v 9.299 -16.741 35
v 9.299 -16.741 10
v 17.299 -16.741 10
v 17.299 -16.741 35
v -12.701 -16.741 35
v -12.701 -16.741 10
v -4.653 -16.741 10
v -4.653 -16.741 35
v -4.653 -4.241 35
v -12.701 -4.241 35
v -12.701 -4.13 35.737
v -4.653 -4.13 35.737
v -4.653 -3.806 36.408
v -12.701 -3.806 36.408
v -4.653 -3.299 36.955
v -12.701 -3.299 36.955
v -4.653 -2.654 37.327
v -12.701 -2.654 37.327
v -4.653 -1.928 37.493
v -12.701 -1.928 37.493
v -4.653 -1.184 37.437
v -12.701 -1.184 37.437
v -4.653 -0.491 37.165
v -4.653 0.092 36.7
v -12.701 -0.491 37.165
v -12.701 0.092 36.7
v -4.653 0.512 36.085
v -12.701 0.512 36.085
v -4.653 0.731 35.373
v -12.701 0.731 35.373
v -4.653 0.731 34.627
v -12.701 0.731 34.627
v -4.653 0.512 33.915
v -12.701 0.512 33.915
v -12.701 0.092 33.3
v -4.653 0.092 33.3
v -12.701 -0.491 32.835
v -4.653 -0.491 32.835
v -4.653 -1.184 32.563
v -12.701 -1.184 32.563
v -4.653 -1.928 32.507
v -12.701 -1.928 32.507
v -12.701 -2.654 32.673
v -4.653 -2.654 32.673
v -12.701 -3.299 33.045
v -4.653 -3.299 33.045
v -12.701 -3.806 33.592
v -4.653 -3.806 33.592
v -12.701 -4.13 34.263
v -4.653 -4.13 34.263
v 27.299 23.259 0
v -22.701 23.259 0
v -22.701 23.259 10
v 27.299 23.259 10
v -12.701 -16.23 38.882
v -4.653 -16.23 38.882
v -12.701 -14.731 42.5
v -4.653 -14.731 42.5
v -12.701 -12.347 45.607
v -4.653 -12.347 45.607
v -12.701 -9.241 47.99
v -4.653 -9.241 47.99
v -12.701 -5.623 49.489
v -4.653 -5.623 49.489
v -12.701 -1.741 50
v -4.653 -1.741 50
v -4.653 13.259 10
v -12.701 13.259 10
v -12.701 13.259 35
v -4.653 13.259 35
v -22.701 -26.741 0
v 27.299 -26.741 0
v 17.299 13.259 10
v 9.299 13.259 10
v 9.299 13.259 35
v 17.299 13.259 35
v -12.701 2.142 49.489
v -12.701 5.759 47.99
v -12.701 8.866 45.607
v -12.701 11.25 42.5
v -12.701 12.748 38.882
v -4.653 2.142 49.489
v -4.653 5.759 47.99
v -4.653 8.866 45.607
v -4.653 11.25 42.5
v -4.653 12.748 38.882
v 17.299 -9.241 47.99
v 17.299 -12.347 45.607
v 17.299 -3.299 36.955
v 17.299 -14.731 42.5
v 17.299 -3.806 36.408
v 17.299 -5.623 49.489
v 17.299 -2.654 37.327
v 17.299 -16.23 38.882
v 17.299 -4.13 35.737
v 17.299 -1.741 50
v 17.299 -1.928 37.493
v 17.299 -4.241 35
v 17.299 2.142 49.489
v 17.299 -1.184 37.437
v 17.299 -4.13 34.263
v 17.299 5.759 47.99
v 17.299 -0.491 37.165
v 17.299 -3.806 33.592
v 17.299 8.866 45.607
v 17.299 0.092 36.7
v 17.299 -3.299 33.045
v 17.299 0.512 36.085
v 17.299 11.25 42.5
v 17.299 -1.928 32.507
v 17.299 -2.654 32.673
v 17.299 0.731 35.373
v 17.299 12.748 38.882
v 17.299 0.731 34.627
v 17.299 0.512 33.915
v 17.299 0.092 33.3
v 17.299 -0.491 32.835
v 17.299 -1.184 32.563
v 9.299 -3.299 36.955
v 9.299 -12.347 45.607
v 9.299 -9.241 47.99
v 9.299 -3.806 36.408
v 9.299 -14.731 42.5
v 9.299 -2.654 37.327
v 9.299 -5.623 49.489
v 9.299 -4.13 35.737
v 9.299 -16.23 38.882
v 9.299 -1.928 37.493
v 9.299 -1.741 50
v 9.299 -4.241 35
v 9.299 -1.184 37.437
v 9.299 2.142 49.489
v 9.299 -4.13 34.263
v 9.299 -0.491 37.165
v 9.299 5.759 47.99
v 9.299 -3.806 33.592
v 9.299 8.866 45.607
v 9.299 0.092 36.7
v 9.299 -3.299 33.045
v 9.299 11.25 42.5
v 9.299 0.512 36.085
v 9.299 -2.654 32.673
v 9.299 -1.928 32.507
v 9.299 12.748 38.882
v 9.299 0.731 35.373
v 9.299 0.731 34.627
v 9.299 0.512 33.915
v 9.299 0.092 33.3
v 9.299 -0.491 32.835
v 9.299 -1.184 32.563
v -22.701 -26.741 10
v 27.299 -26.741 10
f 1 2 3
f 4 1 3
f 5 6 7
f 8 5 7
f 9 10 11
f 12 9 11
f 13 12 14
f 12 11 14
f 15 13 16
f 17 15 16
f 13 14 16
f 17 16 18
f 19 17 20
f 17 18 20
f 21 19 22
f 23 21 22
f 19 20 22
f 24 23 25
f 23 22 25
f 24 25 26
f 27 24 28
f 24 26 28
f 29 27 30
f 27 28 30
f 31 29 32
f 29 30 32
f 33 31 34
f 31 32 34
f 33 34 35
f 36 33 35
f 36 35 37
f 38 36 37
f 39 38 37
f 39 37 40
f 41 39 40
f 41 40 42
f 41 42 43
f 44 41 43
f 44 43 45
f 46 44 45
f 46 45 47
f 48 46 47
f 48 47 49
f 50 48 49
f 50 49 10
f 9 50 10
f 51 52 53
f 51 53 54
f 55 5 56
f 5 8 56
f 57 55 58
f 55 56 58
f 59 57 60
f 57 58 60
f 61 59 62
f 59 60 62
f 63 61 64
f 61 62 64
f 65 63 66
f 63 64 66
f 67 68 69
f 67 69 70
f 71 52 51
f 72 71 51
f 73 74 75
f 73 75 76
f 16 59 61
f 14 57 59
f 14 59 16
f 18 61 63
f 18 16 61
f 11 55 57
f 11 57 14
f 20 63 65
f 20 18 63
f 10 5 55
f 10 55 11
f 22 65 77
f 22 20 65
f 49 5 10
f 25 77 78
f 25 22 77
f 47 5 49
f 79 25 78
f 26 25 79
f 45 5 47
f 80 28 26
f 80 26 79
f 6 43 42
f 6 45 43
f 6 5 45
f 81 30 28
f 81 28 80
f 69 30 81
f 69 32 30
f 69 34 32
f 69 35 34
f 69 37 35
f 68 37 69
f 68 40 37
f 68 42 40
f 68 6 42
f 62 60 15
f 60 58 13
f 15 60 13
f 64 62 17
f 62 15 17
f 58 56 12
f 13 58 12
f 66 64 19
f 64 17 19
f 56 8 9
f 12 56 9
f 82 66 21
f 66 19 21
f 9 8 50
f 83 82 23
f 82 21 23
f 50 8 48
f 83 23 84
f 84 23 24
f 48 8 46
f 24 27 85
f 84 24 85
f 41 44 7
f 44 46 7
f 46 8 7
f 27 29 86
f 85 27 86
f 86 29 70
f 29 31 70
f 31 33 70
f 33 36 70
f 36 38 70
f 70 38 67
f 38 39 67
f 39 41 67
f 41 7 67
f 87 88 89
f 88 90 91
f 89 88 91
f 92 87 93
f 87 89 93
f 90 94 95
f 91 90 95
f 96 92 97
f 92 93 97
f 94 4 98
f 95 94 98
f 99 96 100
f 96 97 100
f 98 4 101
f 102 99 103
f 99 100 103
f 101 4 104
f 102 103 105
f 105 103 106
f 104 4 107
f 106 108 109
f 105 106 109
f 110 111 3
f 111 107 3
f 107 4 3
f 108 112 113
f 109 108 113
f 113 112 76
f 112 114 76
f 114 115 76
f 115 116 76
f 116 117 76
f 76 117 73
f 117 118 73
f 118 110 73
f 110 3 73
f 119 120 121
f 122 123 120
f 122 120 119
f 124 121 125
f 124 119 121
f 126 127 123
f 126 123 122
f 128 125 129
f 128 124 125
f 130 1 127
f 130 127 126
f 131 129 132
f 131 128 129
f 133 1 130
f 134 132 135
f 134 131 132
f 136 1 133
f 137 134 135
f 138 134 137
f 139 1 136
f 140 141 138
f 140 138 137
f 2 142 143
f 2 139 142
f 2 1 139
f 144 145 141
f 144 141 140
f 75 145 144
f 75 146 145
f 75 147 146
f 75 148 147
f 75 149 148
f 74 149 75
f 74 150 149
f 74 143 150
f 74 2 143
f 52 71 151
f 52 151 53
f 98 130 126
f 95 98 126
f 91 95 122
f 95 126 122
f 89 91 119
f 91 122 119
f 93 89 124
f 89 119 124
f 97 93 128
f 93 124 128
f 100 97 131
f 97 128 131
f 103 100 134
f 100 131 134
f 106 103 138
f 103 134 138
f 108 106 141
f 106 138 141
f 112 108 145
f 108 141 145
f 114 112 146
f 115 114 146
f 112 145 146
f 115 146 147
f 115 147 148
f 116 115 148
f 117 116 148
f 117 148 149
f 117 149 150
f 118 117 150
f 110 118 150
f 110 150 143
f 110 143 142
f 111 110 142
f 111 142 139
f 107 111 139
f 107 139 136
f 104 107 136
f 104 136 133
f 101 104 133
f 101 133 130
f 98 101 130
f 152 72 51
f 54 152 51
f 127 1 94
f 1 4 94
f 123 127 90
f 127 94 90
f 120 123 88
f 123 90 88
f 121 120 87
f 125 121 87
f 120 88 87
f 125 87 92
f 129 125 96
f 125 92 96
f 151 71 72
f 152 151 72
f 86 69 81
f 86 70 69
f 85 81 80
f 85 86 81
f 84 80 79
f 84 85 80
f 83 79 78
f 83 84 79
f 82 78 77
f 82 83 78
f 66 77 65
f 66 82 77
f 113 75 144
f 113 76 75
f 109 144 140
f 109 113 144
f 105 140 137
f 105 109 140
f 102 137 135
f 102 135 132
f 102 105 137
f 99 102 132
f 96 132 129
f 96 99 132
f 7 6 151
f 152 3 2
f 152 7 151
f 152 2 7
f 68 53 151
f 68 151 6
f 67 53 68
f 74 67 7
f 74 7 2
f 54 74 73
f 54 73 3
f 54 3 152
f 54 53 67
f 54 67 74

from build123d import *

# Parameters (mm, degrees)
F0_W     = 50
F0_H     = 50
F1_DEPTH = 10
F2_W     = 8.0474452116
F2_H     = 30
F2_W_2   = 8
F3_DEPTH = 40
F4_R     = 14.99999
F6_D     = 5


# Not quite as in the source:
# - a fillet or chamfer is up to 0.001 mm smaller than in the source, because OpenCascade refuses the exact size


with BuildPart() as f1:
    # F0 (on Top) → F1 (new body)
    with BuildSketch(Plane.XY):
        with Locations((2.2992696613, -1.7406867517)):
            Rectangle(F0_W, F0_H)
    extrude(amount=F1_DEPTH)

    # F2 (on face) → F3 (join)
    with BuildSketch(Plane.XY.offset(10)):
        with Locations((-8.6770077329, -1.7406867517)):
            Rectangle(F2_W, F2_H)
        with Locations((13.2992696613, -1.7406867517)):
            Rectangle(F2_W_2, F2_H)
    extrude(amount=F3_DEPTH)

    # F4 (radius 15 in the source; OpenCascade refuses exactly that, so slightly less here)
    f4_edges = [f1.edges().sort_by_distance(p)[0] for p in [
        (-8.677008, -16.740687, 50),
        (13.29927, -16.740687, 50),
        (-8.677008, 13.259313, 50),
        (13.29927, 13.259313, 50),
    ]]
    fillet(f4_edges, radius=F4_R)

    # F6 (through all)
    with Locations(Plane.YZ.offset(17.2992696613)):
        with Locations((-1.7406867517, 35)):
            Hole(F6_D / 2)


solid = f1.part
